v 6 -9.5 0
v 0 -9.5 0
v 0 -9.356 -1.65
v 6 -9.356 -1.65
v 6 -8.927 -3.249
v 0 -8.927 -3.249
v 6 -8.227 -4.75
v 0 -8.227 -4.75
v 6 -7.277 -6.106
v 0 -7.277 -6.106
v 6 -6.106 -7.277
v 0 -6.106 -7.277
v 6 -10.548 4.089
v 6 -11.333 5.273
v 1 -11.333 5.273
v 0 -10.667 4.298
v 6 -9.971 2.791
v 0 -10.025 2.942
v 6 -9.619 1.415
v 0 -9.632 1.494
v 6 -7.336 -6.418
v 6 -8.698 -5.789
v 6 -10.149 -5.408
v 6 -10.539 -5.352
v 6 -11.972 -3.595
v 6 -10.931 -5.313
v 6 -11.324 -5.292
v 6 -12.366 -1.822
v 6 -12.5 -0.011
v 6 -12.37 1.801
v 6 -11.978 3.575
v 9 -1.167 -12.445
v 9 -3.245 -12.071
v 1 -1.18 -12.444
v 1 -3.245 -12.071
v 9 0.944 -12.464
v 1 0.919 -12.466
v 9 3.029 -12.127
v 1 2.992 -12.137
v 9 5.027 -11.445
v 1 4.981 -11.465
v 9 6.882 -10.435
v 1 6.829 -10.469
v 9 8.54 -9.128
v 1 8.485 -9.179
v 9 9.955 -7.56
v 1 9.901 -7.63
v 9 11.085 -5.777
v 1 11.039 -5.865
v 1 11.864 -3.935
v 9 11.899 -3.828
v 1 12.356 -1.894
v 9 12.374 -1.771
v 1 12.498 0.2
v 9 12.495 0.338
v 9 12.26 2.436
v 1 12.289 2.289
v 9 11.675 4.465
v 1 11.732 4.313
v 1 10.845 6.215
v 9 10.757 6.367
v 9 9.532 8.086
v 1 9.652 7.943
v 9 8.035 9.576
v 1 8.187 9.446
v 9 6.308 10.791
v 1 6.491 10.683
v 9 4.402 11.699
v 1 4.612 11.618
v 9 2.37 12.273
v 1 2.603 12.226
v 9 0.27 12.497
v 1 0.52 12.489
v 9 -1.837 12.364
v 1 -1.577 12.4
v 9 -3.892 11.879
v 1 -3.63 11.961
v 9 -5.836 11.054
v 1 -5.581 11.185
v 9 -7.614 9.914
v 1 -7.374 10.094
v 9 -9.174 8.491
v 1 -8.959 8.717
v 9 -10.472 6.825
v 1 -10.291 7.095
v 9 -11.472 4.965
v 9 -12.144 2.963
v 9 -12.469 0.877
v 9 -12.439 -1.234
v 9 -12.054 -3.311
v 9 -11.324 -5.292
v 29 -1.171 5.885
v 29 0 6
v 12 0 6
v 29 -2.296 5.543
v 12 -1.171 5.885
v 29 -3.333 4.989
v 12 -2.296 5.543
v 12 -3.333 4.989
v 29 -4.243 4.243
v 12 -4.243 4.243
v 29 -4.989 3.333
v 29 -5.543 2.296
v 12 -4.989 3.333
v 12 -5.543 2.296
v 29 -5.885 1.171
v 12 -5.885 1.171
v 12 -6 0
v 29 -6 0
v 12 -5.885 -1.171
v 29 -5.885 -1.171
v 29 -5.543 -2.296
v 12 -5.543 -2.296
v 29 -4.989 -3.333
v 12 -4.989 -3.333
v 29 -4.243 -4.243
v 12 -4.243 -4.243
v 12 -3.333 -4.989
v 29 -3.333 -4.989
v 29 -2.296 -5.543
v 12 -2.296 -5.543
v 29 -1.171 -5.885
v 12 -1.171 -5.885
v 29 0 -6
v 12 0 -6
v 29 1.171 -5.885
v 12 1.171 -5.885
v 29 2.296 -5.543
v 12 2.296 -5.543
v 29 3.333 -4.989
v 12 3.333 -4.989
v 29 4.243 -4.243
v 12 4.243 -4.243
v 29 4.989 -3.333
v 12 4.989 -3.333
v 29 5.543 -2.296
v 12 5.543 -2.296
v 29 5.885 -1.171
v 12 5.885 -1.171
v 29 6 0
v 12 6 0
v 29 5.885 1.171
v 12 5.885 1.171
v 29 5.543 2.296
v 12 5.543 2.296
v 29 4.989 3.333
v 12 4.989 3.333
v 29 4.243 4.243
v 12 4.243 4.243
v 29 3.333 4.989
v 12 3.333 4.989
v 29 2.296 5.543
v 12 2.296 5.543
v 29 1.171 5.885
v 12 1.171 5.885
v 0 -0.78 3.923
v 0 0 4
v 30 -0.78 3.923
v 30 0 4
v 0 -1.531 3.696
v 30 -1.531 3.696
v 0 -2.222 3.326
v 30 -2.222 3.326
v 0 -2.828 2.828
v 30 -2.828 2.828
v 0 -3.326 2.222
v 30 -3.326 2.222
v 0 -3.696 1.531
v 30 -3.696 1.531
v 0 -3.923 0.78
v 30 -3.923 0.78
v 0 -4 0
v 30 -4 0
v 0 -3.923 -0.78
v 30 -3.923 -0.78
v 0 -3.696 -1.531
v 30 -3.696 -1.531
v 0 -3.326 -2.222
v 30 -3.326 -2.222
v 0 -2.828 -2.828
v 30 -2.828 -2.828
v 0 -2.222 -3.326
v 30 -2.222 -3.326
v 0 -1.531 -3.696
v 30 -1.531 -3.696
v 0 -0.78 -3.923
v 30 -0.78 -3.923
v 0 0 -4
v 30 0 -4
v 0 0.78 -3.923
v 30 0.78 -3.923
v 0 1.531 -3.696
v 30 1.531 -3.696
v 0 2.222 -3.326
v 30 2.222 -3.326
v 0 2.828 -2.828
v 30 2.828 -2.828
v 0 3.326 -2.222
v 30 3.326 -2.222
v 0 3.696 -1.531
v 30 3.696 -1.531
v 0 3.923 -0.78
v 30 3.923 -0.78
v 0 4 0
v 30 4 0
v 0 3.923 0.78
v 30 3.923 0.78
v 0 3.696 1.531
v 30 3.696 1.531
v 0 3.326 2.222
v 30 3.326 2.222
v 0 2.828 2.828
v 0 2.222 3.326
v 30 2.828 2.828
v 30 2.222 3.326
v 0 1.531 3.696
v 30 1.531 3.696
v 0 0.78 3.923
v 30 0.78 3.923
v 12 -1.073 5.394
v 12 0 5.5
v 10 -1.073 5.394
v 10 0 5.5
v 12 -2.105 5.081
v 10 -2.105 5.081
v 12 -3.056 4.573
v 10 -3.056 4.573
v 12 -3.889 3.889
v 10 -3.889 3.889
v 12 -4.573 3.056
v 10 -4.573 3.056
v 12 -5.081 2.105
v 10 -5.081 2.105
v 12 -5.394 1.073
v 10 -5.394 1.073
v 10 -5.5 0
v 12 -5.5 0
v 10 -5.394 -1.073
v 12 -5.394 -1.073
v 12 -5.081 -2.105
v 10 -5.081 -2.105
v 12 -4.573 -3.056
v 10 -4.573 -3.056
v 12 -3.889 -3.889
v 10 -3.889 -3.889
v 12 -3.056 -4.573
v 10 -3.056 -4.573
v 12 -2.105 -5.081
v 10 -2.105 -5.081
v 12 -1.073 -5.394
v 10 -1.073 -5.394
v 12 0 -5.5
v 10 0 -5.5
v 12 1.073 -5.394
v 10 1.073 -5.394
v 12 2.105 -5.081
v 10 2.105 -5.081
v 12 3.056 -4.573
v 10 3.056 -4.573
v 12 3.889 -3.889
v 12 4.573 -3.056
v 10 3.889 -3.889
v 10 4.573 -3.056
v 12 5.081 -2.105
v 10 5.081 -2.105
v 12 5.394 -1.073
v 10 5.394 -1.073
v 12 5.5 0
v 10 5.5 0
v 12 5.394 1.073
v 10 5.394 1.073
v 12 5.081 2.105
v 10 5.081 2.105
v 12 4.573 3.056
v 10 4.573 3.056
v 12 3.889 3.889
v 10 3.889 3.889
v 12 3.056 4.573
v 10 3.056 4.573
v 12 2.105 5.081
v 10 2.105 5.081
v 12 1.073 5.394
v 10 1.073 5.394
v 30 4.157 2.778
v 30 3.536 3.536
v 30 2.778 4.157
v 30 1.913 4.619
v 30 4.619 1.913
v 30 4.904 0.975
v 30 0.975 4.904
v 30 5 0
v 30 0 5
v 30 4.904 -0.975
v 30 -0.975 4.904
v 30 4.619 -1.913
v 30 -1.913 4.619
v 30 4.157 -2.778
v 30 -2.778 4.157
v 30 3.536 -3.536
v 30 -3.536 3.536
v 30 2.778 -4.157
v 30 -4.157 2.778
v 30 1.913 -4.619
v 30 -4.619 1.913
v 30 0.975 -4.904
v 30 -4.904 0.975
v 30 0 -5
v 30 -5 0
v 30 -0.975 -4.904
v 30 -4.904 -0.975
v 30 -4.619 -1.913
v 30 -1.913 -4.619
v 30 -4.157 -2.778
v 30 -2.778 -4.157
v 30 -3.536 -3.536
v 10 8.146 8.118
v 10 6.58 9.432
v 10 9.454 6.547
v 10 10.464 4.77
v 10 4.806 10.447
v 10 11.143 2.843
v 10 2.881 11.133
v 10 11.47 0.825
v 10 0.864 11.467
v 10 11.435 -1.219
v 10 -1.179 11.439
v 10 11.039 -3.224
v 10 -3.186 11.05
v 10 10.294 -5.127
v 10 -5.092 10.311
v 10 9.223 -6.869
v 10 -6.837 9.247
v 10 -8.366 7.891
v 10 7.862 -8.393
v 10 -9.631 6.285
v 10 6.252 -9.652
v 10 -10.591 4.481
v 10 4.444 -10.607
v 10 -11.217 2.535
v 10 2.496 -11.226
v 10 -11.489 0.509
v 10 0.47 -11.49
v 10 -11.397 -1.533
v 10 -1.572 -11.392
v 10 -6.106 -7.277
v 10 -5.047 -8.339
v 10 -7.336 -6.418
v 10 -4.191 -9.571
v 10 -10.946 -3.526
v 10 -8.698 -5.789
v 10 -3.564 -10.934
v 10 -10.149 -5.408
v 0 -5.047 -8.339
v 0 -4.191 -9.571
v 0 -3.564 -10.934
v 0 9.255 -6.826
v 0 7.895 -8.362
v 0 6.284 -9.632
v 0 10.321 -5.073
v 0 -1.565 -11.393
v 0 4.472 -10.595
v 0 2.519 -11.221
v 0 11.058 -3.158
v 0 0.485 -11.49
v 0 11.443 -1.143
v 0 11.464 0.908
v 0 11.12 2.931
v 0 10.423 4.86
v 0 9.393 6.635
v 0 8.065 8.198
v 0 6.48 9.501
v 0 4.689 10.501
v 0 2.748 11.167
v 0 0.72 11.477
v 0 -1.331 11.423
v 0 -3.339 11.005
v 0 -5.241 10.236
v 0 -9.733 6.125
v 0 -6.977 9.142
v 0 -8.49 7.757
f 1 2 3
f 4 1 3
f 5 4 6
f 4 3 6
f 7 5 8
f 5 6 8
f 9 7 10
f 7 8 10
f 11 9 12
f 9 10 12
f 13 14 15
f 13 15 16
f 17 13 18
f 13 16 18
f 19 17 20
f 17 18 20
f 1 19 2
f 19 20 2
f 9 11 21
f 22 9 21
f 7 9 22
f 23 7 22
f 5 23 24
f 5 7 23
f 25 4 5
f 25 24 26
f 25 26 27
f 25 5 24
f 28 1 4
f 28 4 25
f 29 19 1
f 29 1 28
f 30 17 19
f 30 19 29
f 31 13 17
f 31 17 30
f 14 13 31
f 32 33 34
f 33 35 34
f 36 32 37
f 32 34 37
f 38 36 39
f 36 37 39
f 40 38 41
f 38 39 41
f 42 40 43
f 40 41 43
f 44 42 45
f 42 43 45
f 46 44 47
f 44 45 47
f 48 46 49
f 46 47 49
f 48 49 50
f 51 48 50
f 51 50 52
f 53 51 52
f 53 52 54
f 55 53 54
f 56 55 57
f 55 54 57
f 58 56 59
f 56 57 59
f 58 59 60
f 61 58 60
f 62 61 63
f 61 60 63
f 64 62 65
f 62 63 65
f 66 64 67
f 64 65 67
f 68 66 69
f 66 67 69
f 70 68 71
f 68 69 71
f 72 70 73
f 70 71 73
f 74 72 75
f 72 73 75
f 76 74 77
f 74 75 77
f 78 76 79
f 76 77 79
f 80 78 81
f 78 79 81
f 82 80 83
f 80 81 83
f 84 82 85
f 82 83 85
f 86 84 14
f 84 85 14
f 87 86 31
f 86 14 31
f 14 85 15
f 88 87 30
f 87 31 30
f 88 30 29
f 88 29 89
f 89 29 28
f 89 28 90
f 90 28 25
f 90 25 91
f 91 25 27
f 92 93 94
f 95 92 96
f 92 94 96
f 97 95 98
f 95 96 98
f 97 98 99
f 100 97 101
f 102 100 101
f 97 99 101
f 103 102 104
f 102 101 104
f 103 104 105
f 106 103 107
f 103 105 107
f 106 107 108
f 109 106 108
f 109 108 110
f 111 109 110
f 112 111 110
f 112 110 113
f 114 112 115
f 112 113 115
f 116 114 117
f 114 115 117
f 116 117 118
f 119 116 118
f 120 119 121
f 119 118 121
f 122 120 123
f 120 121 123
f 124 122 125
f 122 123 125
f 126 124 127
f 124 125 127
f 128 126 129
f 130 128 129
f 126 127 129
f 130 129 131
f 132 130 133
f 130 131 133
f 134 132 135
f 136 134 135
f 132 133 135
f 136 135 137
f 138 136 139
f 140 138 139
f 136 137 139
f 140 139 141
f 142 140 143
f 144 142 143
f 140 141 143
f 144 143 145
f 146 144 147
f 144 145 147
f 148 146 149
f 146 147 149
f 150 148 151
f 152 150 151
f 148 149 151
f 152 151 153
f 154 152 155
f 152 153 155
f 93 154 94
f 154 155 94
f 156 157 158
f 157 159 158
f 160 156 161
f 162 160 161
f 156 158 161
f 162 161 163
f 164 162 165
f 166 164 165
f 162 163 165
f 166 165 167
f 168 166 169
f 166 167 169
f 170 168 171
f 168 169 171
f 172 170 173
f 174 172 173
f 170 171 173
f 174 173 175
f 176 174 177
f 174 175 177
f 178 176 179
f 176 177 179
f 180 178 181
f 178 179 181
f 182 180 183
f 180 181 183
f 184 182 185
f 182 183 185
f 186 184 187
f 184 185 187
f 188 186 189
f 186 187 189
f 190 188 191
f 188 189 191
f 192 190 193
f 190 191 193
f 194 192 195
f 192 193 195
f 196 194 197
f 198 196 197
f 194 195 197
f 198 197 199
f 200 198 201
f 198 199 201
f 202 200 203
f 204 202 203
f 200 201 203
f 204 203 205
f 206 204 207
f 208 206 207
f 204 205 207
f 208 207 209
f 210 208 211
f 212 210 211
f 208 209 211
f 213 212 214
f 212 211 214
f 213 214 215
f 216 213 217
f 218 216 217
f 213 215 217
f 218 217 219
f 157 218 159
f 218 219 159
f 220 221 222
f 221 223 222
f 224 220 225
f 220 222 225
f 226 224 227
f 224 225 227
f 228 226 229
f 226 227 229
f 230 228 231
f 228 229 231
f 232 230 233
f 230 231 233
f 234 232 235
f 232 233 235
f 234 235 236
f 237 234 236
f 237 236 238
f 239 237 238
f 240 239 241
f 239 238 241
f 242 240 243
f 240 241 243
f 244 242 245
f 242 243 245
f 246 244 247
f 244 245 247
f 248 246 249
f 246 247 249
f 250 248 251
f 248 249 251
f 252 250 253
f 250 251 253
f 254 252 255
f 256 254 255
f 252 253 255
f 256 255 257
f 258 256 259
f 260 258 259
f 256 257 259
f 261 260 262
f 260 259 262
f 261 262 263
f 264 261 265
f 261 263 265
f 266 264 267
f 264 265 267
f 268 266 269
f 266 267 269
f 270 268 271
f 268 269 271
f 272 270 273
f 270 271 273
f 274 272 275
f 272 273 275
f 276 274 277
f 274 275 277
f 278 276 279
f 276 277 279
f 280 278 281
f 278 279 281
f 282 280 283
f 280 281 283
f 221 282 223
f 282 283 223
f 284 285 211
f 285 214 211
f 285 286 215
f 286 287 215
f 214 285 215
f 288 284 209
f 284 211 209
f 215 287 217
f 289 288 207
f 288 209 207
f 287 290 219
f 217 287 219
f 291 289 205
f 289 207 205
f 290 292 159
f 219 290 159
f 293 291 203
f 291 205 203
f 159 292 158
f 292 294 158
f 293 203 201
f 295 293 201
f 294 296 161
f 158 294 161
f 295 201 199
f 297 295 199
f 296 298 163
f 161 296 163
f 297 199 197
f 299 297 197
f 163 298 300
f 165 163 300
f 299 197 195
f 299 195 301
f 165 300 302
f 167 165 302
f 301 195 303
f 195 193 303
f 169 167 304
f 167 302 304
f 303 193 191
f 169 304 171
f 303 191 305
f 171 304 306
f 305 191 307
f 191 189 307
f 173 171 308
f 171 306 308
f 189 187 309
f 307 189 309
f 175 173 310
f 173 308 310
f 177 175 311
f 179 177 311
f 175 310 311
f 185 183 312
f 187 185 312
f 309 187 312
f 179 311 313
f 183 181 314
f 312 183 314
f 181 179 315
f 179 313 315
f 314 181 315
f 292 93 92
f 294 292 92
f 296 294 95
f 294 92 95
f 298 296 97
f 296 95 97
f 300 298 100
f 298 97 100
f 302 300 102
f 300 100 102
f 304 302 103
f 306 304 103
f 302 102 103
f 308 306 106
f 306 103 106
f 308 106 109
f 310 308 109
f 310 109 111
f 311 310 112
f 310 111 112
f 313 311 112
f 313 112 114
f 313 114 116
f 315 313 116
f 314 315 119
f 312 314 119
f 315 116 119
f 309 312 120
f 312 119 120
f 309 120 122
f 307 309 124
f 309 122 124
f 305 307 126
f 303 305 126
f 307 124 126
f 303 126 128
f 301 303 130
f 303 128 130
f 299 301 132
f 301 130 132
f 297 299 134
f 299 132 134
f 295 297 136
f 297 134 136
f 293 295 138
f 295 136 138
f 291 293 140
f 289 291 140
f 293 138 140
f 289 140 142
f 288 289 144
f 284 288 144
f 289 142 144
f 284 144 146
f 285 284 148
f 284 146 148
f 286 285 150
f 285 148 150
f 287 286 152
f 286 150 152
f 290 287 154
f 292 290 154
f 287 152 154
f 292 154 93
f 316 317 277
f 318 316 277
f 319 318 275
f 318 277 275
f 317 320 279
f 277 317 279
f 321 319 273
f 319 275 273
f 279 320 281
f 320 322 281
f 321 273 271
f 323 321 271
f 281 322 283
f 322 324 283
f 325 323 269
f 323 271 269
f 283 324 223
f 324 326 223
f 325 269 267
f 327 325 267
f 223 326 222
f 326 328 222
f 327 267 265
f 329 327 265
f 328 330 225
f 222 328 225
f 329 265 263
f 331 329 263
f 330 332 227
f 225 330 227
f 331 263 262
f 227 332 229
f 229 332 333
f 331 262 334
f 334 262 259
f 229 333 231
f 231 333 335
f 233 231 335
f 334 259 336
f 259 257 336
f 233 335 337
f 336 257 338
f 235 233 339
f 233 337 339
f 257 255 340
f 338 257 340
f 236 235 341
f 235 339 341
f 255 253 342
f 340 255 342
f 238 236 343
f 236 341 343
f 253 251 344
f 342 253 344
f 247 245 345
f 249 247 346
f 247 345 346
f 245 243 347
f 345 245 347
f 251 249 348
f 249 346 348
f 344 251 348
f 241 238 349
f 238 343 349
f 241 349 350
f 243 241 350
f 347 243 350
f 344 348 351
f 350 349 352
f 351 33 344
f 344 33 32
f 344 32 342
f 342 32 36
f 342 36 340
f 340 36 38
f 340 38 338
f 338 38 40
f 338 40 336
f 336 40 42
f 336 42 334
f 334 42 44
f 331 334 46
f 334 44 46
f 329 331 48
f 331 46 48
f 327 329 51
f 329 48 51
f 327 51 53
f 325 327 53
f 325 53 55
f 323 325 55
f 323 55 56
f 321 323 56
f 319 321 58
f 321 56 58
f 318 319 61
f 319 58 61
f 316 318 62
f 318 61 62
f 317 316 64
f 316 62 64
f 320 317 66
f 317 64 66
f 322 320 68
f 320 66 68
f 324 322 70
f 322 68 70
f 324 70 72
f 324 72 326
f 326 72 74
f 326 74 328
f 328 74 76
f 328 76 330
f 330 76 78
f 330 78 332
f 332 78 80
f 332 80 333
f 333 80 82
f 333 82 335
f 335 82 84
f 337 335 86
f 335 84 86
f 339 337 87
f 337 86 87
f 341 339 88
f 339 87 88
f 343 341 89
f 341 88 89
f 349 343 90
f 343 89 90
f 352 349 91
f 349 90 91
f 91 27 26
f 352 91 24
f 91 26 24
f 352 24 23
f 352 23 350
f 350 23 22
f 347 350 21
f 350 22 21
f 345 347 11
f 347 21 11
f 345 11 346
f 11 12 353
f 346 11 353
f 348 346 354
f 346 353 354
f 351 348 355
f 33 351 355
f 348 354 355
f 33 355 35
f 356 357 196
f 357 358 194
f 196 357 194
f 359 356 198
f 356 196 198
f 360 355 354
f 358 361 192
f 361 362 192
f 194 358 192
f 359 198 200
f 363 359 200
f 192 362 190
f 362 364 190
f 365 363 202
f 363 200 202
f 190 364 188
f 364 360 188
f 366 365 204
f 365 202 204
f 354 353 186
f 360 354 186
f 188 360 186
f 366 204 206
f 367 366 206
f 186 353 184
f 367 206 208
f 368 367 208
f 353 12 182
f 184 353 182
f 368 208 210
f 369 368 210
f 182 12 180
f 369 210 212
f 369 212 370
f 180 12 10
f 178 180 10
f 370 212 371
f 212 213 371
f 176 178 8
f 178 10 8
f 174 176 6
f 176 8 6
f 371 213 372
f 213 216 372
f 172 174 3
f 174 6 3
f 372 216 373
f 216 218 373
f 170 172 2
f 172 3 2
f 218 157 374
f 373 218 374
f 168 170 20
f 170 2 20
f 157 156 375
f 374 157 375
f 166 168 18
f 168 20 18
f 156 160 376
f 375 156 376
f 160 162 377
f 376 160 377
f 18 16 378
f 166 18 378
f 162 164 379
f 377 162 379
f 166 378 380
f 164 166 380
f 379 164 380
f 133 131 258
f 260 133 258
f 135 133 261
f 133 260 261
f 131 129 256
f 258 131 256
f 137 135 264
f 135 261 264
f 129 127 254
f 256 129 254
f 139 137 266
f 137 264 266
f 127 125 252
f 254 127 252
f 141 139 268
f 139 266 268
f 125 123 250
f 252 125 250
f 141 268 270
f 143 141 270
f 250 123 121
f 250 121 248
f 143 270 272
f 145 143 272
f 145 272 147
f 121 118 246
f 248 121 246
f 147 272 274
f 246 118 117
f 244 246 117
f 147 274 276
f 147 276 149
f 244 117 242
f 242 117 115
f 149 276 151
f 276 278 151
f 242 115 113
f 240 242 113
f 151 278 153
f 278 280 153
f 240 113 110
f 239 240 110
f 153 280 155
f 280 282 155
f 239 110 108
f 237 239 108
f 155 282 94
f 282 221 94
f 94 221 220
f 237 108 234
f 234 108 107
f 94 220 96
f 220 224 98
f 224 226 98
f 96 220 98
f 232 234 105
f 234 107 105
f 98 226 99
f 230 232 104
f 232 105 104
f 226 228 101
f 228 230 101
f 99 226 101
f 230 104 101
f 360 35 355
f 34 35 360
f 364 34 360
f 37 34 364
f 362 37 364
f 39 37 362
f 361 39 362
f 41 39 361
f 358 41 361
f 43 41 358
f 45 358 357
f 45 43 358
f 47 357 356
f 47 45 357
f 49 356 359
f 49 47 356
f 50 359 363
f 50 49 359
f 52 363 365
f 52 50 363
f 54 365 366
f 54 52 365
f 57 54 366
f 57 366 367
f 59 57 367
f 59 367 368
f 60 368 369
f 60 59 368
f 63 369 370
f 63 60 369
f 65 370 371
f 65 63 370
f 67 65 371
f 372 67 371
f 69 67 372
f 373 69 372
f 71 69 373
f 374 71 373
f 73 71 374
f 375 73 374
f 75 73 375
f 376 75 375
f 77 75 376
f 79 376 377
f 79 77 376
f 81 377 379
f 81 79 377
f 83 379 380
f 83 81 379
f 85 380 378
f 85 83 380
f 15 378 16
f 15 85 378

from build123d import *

# Parameters (mm, degrees)
F2_SIZE  = 1
F4_DEPTH = 10
F6_DEPTH = 6


with BuildPart() as f1:
    # F0 (on Front) → F1 (revolve)
    with BuildSketch(Plane.XZ):
        Polygon((0, 12.5), (0, 4), (30, 4), (30, 6), (12, 6), (12, 5.5), (10, 5.5), (10, 12.5), align=None)
    revolve(axis=Axis((7.8071541328, 0, 0), (1, 0, 0)))

    # F2
    f2_edges = [f1.edges().sort_by_distance(p)[0] for p in [
        (30, 0, -6),
        (10, 0, -12.5),
        (0, 0, -12.5),
    ]]
    chamfer(f2_edges, length=F2_SIZE)

    # F3 (on face) → F4 (cut)
    with BuildSketch(Plane(origin=(0, 0, 0), x_dir=(0, -1, 0), z_dir=(-1, 0, 0))):
        with BuildLine():
            ThreePointArc((3.2454993279, -12.0713186567), (8.0348451211, -9.575555539), (11.3243531583, -5.2923553873))
            ThreePointArc((11.3243531583, -5.2923553873), (6.106482292, -7.2774222096), (3.2454993279, -12.0713186567))
        make_face()
    extrude(amount=-F4_DEPTH, mode=Mode.SUBTRACT)

    # F5 (on face) → F6 (cut)
    with BuildSketch(Plane(origin=(0, 0, 0), x_dir=(0, -1, 0), z_dir=(-1, 0, 0))):
        with BuildLine():
            ThreePointArc((9.5, 0), (8.6099239768, -4.0148734865), (6.106482292, -7.2774222096))
            ThreePointArc((6.106482292, -7.2774222096), (8.003069241, -6.0735072132), (10.1488083402, -5.4084830844))
            ThreePointArc((10.1488083402, -5.4084830844), (10.7345609878, -5.3299734663), (11.3243531583, -5.2923553873))
            ThreePointArc((11.3243531583, -5.2923553873), (12.4999954848, -0.0106244522), (11.3333333333, 5.2730973399))
            ThreePointArc((11.3333333333, 5.2730973399), (9.9714052703, 2.7913557041), (9.5, 0))
        make_face()
    extrude(amount=-F6_DEPTH, mode=Mode.SUBTRACT)


solid = f1.part
